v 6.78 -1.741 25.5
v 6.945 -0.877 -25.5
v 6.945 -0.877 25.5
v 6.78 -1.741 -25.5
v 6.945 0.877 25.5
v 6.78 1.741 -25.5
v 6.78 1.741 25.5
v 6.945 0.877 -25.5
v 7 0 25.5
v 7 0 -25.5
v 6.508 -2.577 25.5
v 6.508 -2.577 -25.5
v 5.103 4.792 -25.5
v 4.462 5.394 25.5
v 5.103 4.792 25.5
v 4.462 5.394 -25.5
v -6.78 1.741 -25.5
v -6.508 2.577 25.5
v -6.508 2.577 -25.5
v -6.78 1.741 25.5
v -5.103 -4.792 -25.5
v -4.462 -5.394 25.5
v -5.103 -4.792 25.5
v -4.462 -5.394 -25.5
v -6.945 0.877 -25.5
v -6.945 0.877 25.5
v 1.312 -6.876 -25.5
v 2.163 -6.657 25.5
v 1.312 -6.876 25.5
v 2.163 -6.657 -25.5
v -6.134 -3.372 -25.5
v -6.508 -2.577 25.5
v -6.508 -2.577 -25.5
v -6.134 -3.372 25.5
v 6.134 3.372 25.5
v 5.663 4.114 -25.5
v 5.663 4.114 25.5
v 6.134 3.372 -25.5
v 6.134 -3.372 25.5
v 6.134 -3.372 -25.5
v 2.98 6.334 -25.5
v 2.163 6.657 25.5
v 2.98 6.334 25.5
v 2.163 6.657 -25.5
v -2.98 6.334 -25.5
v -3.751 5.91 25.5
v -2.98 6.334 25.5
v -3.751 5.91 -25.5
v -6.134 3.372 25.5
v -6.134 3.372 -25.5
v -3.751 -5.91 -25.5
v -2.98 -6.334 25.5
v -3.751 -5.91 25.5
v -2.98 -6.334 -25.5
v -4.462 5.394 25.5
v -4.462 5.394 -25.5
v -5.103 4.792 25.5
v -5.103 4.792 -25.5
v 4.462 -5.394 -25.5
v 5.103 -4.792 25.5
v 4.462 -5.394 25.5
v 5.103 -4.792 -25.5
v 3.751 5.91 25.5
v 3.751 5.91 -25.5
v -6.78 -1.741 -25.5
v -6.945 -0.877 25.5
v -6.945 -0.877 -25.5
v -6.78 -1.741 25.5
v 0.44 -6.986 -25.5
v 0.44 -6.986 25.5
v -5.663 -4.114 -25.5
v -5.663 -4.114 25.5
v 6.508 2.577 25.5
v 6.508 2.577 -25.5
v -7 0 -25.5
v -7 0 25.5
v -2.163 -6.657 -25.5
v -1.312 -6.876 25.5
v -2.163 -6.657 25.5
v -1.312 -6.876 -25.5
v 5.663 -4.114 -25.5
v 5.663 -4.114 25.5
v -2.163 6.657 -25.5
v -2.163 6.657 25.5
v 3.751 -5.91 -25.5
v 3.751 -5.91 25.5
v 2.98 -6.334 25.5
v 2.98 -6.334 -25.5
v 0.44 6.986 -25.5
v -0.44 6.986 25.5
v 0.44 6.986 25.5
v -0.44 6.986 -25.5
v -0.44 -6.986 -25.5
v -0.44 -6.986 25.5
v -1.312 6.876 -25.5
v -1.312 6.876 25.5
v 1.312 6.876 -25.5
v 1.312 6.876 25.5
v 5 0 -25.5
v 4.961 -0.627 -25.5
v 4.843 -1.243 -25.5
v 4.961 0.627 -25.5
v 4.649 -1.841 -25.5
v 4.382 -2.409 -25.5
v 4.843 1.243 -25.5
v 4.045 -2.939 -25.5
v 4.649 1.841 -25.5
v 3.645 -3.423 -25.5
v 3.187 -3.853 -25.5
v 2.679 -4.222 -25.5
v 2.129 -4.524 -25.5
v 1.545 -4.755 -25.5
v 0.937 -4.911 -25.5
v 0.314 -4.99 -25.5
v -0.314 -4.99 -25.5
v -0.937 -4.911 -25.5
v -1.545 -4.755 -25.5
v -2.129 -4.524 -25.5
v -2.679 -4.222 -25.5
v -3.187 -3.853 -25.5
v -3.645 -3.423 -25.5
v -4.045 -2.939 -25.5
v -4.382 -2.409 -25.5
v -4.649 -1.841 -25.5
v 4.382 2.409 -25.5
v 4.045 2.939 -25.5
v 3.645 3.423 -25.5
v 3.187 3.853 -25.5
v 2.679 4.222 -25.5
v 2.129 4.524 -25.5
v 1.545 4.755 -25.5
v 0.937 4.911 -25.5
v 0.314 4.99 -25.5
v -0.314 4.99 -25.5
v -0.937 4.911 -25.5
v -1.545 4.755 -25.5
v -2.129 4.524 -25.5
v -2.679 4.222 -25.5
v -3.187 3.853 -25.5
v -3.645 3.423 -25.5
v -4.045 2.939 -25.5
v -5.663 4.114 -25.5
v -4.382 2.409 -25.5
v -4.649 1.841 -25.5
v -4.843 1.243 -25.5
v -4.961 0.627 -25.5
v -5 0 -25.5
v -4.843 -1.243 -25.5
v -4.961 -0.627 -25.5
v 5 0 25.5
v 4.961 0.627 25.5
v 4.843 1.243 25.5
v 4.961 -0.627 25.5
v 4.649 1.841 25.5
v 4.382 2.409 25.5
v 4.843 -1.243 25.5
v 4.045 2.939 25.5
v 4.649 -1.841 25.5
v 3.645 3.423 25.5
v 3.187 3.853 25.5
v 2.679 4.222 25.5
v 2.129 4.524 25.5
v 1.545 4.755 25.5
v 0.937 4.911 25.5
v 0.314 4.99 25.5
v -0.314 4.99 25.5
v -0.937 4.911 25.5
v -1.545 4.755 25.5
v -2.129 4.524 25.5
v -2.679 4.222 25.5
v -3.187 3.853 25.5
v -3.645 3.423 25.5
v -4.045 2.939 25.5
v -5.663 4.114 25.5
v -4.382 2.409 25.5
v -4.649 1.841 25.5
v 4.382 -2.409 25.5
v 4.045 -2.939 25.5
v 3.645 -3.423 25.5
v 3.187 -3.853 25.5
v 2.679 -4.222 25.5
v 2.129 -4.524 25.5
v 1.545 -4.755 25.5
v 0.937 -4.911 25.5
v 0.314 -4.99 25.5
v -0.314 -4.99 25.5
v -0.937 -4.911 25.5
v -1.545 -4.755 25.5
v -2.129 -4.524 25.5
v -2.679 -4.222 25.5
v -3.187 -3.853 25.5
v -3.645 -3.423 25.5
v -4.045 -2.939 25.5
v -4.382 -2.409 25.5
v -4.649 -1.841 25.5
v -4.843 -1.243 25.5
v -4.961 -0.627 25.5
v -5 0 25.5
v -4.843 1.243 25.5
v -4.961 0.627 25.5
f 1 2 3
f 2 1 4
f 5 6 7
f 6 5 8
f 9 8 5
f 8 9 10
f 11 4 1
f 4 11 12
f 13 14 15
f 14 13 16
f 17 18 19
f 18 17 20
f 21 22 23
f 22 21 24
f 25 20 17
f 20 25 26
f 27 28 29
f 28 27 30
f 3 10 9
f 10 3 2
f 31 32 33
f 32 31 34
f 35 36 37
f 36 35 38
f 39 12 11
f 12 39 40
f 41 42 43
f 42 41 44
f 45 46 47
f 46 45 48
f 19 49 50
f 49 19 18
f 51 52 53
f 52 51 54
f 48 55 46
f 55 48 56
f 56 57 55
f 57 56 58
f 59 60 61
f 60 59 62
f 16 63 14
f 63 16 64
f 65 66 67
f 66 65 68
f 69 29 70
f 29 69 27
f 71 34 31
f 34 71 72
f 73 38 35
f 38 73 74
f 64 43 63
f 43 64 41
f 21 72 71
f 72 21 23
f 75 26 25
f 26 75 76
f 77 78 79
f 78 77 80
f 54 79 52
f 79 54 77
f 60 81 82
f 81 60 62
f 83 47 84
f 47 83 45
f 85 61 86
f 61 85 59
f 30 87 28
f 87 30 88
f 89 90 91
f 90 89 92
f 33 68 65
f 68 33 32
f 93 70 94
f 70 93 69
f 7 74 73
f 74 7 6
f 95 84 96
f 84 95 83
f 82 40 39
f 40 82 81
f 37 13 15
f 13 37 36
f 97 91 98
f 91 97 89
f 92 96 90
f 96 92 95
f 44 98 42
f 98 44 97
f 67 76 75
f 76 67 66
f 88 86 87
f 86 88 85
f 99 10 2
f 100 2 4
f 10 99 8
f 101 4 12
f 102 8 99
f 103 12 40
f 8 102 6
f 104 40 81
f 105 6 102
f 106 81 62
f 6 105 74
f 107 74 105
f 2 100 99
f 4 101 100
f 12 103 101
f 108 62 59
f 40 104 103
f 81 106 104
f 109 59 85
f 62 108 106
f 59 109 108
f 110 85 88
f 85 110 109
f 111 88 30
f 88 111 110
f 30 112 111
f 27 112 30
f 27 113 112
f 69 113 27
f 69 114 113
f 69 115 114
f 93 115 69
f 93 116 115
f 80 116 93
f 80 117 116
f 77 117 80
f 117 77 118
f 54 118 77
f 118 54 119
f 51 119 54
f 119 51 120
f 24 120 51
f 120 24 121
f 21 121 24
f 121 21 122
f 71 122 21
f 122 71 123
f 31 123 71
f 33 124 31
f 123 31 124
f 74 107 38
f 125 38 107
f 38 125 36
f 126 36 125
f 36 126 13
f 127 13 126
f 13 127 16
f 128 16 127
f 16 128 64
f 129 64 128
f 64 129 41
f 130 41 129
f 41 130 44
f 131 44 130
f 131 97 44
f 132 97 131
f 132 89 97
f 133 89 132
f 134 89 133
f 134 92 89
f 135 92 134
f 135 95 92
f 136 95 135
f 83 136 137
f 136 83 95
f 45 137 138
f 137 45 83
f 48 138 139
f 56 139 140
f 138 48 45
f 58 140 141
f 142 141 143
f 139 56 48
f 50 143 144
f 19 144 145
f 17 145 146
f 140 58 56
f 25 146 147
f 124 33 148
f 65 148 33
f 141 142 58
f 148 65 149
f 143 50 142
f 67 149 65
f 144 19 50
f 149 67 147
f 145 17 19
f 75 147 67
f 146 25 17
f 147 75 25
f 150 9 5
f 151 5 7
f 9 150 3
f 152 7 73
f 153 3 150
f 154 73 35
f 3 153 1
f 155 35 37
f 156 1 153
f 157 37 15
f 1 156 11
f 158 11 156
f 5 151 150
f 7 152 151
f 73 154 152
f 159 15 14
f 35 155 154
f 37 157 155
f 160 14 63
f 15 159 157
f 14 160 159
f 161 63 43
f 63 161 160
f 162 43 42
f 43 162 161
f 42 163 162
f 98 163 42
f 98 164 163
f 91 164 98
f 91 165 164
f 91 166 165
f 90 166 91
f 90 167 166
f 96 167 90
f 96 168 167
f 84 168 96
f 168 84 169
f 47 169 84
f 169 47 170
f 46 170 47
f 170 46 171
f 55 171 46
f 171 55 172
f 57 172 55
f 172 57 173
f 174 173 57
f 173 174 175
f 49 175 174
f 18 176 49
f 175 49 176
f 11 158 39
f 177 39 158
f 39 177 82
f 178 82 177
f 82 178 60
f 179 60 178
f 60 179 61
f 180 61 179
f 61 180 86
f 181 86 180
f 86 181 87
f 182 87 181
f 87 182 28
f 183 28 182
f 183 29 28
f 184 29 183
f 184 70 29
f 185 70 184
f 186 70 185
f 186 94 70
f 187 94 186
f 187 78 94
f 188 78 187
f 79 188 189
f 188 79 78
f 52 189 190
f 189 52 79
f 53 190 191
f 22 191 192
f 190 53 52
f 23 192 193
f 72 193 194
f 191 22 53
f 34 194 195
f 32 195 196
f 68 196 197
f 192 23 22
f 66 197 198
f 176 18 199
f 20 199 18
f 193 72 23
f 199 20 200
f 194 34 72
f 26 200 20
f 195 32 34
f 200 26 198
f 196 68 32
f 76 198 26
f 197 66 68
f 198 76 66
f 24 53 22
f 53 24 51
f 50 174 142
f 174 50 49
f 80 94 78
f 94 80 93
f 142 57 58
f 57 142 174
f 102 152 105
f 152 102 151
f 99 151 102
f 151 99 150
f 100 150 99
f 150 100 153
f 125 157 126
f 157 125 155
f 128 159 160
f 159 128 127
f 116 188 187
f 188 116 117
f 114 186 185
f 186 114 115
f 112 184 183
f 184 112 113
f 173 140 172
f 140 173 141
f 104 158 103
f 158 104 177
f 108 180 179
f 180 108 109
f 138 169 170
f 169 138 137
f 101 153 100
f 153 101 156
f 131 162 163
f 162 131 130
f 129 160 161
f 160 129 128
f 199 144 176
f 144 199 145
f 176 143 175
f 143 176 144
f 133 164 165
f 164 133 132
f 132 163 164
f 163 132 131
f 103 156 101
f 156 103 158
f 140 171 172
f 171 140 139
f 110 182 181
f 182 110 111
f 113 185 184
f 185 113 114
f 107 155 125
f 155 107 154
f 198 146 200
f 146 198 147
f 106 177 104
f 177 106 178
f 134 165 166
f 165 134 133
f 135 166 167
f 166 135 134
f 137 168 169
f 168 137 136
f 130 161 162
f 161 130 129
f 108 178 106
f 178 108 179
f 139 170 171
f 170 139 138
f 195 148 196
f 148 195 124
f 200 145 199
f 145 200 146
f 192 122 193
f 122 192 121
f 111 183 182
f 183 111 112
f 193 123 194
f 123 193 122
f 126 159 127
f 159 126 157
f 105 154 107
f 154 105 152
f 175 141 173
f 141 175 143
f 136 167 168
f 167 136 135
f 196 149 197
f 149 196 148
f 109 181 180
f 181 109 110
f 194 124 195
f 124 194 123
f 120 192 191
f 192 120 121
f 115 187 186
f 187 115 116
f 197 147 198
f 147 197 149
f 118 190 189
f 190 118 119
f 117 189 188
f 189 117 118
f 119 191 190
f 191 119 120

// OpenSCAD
$fn = 50;


difference() {
	union() {
		translate(v = [0, 0, -25.5000000000]) {
			cylinder(h = 51, r = 7.0000000000);
		}
	}
	union() {
		translate(v = [0, 0, -100.0000000000]) {
			cylinder(h = 200, r = 5.0000000000);
		}
	}
}
